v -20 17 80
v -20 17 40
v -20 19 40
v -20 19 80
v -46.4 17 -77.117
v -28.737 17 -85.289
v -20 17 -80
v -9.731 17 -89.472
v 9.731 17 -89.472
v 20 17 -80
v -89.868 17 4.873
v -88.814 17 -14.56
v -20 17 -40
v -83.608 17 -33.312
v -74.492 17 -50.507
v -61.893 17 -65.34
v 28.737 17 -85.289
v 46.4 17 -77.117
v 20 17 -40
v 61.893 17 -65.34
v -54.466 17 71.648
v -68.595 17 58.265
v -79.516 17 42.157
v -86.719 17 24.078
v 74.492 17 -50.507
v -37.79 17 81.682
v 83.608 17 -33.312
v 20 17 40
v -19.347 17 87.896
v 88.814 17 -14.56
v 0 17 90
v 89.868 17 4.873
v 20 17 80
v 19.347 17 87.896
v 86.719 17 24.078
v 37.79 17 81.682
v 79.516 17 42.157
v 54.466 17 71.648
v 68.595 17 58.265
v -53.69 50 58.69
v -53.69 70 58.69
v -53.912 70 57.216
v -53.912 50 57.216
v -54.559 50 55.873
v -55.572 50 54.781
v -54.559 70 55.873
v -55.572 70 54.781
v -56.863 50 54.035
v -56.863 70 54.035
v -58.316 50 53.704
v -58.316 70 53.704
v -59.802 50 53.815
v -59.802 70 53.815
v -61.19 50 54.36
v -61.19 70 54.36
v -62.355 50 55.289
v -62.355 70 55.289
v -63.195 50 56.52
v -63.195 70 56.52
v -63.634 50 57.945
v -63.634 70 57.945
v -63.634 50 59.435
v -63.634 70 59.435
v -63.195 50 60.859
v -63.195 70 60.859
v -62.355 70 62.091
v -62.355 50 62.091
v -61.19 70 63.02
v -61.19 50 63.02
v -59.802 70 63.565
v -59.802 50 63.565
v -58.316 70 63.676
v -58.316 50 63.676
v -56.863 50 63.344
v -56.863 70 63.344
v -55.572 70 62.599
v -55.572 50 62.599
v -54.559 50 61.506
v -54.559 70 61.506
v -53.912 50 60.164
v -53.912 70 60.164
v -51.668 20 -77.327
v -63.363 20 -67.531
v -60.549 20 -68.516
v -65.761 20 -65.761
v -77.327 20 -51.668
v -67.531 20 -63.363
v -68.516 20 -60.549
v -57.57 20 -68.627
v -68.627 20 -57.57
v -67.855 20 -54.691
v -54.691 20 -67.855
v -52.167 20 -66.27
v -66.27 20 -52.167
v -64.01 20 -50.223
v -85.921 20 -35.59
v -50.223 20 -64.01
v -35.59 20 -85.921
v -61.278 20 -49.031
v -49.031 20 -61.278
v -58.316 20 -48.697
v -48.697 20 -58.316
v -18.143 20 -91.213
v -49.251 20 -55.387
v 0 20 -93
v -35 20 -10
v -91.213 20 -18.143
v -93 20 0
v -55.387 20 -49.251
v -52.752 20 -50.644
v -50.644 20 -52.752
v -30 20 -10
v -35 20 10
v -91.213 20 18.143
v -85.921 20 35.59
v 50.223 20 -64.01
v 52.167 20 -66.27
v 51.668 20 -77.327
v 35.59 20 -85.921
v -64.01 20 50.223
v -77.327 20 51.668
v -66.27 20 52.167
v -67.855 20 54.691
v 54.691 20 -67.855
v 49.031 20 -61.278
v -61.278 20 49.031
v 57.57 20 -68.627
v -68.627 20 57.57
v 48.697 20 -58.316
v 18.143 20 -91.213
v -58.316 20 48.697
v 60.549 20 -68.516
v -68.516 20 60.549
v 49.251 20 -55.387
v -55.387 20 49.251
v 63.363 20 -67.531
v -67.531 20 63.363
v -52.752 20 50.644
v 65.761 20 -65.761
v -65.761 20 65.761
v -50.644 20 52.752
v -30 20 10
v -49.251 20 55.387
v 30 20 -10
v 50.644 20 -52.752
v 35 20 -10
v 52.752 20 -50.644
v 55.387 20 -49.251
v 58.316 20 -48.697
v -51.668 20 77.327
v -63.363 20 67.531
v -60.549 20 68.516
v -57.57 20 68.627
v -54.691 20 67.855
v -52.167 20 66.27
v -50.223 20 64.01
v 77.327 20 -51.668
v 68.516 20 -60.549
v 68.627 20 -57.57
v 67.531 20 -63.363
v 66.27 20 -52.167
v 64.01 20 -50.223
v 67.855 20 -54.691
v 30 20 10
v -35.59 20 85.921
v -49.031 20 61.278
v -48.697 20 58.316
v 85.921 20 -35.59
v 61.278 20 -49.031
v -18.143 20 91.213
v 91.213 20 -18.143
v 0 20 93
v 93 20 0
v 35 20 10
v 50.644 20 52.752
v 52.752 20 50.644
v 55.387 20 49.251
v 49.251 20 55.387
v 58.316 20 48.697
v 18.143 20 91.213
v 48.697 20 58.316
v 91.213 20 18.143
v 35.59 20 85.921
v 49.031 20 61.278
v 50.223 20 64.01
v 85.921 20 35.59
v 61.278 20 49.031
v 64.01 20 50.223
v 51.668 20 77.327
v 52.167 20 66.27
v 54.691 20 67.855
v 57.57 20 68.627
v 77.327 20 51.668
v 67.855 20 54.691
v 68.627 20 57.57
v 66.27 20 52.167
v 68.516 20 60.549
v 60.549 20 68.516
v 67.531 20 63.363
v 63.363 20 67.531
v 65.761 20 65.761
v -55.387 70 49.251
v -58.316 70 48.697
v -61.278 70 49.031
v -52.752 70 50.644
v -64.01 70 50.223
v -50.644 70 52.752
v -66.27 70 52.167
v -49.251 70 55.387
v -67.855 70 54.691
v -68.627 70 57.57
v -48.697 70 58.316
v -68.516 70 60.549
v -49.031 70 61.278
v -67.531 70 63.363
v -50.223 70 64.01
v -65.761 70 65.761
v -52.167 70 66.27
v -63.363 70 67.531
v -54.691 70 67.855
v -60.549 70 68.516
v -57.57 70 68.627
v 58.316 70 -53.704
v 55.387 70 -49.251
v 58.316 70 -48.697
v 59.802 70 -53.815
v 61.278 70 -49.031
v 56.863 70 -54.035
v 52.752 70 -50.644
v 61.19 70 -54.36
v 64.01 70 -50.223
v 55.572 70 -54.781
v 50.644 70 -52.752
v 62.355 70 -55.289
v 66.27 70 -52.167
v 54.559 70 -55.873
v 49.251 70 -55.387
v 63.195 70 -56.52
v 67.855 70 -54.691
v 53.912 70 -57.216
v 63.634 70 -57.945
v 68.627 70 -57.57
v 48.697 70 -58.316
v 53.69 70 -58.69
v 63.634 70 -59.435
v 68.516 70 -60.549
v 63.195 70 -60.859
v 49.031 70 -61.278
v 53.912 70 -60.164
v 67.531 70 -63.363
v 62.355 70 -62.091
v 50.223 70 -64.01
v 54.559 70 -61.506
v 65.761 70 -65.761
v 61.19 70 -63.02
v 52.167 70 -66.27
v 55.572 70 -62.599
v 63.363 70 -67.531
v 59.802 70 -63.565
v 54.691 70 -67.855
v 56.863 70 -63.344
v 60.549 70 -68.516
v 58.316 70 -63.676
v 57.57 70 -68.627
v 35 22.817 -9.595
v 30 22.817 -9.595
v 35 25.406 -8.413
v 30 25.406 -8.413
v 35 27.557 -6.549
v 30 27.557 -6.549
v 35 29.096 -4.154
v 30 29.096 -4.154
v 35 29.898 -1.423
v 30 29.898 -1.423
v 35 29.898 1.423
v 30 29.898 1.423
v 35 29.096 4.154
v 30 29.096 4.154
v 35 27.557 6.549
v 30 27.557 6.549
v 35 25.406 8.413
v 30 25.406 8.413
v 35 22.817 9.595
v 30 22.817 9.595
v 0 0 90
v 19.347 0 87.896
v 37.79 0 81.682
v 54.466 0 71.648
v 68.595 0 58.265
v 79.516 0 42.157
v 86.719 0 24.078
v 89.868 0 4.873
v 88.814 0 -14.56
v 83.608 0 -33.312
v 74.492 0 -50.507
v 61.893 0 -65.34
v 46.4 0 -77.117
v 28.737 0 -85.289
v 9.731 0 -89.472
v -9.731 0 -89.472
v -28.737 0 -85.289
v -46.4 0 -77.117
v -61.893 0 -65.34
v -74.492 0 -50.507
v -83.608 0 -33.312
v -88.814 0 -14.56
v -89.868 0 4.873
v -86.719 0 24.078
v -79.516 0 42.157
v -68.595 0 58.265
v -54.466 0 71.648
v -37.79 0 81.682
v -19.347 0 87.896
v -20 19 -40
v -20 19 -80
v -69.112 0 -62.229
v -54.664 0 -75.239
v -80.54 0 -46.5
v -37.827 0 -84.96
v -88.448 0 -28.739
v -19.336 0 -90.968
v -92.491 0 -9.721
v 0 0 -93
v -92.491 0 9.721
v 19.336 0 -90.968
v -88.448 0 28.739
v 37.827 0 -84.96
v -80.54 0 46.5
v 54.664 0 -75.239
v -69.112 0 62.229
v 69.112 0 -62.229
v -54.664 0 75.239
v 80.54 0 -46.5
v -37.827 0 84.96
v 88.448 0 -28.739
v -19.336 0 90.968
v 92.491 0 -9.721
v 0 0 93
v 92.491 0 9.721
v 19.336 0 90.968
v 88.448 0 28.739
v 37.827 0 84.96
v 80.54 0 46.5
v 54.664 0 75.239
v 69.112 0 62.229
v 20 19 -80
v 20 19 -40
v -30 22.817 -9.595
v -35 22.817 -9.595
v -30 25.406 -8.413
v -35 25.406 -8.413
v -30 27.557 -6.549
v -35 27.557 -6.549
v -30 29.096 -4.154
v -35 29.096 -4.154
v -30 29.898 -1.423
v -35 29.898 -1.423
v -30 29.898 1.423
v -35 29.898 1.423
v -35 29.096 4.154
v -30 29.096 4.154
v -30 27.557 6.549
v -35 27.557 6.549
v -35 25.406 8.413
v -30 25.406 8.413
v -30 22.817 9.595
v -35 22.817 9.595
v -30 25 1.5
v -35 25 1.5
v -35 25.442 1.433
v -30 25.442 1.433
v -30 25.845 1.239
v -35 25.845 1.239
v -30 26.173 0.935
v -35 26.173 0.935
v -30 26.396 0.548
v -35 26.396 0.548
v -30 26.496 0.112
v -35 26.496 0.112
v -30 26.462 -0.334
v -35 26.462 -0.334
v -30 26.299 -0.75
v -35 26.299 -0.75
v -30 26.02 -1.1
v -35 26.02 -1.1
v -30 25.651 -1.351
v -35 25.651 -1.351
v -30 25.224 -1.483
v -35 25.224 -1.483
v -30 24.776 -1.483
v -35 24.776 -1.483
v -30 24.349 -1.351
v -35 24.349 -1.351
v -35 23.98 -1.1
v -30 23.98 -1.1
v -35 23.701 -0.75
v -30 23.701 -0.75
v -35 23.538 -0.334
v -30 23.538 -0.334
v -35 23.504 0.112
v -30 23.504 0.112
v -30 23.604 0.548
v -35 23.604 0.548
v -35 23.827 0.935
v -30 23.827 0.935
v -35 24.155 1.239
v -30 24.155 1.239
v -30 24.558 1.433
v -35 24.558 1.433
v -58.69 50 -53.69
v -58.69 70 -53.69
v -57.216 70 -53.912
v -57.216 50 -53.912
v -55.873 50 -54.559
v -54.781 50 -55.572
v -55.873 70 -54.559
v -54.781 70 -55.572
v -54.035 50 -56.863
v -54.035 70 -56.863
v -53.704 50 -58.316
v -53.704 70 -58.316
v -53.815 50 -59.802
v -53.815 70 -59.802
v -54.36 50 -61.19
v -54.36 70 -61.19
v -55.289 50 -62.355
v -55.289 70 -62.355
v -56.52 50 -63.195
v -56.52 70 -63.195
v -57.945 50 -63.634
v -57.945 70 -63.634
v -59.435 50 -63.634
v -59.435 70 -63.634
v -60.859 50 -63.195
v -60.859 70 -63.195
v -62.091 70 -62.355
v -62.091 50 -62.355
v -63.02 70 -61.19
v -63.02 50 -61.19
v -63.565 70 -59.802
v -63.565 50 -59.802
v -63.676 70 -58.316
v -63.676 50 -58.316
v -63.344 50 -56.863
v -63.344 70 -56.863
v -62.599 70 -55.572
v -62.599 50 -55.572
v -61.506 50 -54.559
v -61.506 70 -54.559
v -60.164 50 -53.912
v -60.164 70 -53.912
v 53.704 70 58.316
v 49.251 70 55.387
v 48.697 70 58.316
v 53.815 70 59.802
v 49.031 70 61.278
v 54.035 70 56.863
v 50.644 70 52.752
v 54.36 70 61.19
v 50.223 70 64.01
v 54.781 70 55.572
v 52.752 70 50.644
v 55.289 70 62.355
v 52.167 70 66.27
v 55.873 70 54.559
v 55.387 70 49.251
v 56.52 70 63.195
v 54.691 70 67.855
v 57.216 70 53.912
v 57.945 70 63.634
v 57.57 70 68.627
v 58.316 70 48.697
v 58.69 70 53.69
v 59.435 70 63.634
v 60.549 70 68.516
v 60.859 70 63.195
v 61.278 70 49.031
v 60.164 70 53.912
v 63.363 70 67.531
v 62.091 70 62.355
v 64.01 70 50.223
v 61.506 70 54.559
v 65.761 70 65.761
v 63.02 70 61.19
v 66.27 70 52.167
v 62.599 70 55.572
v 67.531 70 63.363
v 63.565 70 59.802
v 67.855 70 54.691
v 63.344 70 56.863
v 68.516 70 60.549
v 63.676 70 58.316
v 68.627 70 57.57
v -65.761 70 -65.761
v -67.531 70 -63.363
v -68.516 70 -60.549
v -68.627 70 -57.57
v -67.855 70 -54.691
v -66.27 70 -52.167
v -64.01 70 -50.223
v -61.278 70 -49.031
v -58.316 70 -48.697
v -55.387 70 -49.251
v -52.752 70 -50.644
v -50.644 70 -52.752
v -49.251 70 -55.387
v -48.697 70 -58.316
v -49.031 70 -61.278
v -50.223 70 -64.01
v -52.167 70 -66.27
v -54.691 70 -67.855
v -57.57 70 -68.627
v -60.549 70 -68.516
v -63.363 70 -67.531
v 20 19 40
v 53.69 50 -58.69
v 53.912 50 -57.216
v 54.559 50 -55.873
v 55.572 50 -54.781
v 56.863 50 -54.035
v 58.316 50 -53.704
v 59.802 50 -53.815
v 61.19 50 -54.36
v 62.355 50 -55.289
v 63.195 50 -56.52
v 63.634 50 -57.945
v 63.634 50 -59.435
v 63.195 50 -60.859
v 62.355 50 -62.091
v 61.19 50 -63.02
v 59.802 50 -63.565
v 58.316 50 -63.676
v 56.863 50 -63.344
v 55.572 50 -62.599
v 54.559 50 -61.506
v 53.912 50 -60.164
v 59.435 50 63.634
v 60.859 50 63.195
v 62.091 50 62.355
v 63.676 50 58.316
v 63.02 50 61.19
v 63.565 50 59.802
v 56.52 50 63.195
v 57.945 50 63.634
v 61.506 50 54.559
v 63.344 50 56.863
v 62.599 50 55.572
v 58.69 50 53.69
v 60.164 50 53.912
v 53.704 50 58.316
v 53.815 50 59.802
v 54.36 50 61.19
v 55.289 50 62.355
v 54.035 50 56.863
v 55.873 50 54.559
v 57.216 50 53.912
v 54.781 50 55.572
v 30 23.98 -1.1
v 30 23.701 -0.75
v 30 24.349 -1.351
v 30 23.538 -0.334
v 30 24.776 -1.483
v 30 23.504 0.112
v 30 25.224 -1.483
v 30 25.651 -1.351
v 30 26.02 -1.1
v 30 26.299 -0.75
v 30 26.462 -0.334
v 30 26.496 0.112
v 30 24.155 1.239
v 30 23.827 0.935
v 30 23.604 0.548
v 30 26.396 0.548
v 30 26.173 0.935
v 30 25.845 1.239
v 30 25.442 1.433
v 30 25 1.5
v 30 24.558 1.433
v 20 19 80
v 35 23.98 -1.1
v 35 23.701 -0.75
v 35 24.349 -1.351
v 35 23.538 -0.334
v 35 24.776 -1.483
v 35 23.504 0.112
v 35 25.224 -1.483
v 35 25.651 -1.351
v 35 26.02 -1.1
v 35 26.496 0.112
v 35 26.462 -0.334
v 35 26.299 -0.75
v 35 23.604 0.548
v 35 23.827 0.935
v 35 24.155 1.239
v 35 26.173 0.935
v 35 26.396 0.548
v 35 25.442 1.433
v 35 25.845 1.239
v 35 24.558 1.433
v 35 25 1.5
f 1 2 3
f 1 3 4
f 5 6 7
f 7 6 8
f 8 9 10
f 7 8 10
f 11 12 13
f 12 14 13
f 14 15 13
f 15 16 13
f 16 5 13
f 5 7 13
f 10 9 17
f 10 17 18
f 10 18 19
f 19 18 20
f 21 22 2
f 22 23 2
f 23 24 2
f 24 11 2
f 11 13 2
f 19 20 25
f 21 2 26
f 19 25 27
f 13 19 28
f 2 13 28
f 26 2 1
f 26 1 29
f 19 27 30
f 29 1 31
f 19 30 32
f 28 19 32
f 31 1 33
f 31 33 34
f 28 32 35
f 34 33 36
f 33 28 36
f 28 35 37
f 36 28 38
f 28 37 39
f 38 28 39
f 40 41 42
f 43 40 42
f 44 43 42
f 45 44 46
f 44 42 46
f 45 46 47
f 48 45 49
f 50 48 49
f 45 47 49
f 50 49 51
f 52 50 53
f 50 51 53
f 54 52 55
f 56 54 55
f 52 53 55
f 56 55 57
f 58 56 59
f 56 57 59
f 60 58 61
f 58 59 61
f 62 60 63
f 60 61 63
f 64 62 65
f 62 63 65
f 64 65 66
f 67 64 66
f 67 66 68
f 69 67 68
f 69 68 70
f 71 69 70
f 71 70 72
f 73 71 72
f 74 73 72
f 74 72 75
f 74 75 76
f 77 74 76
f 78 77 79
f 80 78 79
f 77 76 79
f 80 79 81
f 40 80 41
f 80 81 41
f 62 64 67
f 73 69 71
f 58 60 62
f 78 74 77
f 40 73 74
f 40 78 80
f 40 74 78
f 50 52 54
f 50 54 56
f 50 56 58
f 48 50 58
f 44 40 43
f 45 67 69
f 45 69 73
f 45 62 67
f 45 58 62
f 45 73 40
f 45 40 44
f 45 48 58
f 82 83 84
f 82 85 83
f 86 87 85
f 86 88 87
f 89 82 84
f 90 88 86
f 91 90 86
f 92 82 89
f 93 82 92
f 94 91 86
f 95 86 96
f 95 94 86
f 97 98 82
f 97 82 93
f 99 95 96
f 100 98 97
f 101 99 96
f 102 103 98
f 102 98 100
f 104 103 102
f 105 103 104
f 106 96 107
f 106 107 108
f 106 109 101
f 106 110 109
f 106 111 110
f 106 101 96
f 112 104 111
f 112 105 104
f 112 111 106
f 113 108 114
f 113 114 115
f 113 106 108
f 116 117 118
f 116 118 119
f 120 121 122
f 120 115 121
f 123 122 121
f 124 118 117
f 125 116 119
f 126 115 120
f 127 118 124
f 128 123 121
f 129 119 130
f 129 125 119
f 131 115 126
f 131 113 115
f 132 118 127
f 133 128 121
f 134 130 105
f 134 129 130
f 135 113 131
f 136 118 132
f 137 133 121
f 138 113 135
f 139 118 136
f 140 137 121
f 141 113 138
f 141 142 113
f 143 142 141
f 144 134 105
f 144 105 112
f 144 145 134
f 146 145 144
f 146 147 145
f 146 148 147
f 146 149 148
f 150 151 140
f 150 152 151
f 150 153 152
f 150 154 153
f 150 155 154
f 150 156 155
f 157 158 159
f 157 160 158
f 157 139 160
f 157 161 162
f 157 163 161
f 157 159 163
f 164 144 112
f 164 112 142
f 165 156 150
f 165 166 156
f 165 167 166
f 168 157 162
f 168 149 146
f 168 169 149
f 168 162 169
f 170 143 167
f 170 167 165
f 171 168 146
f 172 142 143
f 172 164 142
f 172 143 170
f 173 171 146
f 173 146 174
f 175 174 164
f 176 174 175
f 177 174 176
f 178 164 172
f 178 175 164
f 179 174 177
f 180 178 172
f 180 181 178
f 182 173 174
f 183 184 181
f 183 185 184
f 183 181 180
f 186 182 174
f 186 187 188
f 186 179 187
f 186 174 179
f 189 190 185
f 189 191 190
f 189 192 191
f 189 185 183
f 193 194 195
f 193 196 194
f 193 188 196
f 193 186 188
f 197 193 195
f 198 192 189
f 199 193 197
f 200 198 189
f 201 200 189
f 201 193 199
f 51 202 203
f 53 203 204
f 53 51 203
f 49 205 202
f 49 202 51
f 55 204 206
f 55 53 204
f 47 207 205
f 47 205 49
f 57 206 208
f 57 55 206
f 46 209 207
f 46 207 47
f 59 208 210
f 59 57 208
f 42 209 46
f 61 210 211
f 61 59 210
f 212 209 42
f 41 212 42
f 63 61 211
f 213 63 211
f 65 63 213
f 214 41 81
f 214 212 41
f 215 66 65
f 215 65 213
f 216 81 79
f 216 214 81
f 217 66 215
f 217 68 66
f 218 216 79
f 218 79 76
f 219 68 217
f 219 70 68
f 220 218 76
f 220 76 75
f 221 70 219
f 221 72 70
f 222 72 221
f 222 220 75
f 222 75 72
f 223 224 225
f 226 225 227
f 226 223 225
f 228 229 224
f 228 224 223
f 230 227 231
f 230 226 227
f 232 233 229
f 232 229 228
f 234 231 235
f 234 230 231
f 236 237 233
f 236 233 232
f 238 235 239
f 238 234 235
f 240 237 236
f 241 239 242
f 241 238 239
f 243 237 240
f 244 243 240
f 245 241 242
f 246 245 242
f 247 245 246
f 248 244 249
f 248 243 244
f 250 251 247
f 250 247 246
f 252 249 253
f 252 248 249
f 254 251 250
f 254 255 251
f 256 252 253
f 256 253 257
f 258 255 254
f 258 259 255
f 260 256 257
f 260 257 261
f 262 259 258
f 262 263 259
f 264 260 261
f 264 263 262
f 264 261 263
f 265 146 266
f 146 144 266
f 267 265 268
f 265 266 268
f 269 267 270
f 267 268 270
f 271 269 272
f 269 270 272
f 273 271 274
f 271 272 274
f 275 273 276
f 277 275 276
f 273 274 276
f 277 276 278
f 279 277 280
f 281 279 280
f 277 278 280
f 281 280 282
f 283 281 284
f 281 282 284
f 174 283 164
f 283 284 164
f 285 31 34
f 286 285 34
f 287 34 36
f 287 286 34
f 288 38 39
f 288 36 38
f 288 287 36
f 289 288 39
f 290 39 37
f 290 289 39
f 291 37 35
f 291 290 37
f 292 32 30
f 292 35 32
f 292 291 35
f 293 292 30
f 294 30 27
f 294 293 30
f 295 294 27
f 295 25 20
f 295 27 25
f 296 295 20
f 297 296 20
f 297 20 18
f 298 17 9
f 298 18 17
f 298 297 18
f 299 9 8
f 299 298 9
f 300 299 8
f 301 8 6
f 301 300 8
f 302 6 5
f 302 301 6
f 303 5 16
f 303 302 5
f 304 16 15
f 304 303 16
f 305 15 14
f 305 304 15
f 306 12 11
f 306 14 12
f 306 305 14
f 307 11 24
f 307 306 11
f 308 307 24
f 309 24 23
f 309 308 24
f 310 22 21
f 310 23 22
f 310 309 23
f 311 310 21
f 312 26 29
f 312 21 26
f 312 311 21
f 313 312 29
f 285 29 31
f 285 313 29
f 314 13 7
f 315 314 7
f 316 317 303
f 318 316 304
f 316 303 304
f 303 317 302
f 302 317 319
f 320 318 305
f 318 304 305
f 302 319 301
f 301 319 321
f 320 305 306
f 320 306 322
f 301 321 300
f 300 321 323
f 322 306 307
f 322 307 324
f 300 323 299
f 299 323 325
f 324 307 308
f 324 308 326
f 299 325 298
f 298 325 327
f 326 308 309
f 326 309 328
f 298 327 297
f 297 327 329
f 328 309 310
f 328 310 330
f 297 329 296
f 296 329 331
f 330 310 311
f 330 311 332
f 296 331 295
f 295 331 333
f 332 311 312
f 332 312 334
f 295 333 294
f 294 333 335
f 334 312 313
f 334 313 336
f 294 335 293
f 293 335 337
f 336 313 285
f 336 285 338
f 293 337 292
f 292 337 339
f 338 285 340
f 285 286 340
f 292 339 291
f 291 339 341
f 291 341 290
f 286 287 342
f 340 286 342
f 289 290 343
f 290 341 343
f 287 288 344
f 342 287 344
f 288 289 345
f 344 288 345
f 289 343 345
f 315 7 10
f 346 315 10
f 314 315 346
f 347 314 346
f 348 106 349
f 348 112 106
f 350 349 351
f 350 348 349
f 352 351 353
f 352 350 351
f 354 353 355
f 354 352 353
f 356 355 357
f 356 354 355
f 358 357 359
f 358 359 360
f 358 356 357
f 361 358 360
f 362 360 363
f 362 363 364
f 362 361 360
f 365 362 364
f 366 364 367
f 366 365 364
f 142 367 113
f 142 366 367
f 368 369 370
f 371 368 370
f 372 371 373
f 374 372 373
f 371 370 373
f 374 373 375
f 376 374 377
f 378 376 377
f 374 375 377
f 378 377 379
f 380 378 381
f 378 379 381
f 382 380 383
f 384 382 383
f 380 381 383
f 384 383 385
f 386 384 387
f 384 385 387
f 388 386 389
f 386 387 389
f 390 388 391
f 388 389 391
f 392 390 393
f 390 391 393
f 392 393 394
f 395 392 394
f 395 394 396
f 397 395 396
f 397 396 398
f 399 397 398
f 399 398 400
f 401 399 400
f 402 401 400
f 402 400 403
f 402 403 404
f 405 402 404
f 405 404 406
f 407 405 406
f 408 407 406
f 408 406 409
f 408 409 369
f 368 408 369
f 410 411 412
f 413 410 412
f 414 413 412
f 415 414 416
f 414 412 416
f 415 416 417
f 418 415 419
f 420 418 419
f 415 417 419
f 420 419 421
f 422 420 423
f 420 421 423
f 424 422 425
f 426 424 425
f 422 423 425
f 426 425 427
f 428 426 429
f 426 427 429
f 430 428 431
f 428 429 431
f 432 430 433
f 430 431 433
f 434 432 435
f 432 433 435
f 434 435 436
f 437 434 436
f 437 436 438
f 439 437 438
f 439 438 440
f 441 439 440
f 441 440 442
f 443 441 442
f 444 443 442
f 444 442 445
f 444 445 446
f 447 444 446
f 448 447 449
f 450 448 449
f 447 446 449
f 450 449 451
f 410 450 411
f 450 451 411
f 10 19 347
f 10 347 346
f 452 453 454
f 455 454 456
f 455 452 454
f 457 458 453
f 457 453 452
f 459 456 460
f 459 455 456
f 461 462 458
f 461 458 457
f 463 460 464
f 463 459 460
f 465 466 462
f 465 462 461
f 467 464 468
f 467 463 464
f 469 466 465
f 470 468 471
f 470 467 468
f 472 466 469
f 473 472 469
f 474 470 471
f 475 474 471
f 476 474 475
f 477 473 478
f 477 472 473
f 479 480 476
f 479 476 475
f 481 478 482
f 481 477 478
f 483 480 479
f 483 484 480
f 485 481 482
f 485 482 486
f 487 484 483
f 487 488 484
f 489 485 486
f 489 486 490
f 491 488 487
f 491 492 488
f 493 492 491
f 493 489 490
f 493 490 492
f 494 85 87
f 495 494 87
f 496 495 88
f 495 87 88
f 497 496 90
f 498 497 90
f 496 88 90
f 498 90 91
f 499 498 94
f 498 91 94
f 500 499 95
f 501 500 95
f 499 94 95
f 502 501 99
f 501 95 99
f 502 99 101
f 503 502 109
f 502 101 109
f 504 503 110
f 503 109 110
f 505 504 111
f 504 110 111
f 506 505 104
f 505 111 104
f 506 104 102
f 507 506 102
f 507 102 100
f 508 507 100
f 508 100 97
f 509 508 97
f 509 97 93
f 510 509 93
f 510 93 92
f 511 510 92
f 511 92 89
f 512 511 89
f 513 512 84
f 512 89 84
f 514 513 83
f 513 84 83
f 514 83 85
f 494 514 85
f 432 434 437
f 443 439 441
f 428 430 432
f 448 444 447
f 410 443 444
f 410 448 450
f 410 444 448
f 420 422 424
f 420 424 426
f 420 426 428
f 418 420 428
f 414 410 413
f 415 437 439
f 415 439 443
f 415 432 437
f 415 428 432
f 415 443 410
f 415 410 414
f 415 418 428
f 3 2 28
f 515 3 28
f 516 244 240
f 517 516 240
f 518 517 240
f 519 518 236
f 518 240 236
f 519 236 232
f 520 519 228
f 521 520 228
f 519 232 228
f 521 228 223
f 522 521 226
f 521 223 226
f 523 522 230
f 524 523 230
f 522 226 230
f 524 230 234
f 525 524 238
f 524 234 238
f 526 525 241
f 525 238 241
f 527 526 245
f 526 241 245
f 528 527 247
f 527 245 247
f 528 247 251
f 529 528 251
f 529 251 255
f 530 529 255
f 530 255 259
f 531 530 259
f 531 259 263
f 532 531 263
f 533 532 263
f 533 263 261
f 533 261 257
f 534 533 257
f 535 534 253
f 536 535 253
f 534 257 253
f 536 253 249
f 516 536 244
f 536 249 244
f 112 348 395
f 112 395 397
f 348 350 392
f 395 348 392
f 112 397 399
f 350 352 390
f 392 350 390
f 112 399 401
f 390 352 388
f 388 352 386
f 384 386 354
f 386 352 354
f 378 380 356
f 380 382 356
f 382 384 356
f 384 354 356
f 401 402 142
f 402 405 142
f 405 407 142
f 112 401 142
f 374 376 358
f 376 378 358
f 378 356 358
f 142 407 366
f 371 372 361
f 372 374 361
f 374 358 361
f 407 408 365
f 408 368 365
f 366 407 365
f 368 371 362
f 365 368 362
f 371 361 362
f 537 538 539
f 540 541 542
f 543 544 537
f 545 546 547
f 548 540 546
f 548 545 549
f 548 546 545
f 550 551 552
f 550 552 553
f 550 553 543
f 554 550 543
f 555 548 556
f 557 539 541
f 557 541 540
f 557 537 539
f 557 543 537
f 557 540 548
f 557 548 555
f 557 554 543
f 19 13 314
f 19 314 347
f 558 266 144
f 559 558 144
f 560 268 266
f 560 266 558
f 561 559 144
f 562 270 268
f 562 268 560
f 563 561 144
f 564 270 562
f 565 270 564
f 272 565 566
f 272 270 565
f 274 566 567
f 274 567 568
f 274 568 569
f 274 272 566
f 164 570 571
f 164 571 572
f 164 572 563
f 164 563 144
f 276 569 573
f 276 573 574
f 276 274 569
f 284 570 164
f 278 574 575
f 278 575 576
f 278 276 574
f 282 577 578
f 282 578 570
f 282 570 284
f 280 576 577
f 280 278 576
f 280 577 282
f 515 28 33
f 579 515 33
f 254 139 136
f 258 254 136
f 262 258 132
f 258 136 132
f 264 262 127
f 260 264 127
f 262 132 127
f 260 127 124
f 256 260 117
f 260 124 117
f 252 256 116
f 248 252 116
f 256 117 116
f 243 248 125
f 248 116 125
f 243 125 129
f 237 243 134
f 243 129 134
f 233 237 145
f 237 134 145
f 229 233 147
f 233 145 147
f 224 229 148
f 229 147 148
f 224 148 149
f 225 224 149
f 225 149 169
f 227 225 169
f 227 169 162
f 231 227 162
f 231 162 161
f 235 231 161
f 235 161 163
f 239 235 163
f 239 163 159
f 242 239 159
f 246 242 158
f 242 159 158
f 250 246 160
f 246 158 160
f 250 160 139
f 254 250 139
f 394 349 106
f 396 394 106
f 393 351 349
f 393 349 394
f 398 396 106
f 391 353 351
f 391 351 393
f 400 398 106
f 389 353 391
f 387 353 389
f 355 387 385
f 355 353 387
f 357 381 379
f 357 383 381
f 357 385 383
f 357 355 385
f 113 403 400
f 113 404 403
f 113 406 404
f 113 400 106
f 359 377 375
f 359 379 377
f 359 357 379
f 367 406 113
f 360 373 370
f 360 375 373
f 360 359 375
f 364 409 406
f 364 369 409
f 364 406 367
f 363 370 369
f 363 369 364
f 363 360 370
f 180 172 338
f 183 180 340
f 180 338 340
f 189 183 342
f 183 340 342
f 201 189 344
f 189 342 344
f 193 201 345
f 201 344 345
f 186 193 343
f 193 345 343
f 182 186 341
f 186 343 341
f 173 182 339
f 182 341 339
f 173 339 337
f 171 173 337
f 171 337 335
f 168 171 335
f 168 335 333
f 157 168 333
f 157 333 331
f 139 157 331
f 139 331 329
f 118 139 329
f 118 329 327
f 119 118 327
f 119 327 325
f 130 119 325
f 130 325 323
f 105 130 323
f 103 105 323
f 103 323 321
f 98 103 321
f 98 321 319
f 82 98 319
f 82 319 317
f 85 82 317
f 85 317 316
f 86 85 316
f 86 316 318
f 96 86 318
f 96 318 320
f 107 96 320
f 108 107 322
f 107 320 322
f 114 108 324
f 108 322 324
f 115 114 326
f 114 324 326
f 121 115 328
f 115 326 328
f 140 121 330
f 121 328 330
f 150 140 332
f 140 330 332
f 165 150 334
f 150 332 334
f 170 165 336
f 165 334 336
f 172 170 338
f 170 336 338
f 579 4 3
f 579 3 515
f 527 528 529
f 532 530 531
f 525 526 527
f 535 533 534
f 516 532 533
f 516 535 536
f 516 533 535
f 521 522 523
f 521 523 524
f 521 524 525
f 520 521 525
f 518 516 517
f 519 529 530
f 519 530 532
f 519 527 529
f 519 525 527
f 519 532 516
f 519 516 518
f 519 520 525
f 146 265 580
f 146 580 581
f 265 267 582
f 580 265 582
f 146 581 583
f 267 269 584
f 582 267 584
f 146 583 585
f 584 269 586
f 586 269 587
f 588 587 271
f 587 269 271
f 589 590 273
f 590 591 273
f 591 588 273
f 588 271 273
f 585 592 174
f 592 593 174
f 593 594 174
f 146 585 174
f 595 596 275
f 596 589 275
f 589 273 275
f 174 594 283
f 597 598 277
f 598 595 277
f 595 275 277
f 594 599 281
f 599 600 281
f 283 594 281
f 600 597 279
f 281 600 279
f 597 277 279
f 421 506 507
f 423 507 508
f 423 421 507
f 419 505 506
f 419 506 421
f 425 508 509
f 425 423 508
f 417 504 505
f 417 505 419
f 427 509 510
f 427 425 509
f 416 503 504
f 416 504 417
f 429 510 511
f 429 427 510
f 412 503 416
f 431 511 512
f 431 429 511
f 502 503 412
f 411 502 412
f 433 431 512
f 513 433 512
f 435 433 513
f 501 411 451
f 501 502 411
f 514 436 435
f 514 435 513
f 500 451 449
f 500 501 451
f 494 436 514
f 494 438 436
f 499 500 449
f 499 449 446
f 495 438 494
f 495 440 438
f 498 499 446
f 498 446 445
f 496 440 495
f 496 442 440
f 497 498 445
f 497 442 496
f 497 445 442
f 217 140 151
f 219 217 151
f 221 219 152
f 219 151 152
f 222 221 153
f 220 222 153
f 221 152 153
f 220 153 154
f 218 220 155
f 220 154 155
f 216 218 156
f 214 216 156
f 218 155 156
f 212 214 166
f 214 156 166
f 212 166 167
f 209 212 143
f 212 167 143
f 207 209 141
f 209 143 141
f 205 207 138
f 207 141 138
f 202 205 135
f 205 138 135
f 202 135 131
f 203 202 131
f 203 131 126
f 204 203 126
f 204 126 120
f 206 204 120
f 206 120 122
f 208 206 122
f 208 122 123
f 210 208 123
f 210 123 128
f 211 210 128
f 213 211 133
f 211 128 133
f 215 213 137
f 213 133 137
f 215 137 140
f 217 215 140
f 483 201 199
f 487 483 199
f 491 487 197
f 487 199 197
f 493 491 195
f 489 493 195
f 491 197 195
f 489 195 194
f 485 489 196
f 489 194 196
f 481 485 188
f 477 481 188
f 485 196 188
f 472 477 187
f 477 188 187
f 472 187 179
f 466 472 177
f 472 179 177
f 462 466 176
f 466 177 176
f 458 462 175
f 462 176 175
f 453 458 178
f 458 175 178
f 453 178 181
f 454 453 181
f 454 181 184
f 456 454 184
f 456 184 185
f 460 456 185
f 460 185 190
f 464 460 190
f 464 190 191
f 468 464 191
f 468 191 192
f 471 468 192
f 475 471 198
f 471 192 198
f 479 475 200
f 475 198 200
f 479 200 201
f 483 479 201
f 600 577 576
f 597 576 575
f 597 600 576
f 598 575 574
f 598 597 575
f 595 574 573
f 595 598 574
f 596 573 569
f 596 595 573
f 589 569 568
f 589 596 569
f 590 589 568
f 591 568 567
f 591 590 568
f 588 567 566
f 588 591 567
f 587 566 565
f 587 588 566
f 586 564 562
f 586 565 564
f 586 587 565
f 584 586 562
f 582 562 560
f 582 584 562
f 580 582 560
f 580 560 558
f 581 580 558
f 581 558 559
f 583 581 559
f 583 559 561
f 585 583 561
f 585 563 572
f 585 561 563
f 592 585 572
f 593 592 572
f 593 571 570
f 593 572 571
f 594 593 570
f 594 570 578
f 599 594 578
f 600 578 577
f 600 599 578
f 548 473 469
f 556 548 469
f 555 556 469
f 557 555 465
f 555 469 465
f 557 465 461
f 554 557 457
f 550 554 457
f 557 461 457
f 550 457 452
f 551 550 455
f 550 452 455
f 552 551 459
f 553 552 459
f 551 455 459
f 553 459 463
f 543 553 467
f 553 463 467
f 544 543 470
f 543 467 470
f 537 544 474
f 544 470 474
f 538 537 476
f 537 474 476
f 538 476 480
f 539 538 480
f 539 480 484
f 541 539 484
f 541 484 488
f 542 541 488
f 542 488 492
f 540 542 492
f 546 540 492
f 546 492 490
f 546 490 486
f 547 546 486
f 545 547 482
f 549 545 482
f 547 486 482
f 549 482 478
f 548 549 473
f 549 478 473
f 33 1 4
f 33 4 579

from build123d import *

# Parameters (mm, degrees)
SKETCH1_R           = 93
BOSS_EXTRUDE1_DEPTH = 20
SHELL1_T            = -3
SKETCH2_W           = 5
SKETCH2_H           = 10
REVOLVE1_ANGLE      = 180
SKETCH7_R           = 1.5
CUT_EXTRUDE1_DEPTH  = 10
SKETCH8_W           = 40
SKETCH8_H           = 40
CUT_EXTRUDE2_DEPTH  = 2
SKETCH9_R           = 10
BOSS_EXTRUDE2_DEPTH = 50
SKETCH10_R          = 5
CUT_EXTRUDE3_DEPTH  = 20
CIRPATTERN1_COUNT   = 4


with BuildPart() as part:
    # Sketch1 → Boss-Extrude1 (new body)
    with BuildSketch(Plane(origin=(0, 0, 0), x_dir=(1, 0, 0), z_dir=(0, 1, 0))):
        with Locations(Location((0, 0, 0), (0, 0, 270))):
            Circle(SKETCH1_R)
    extrude(amount=BOSS_EXTRUDE1_DEPTH)

    # Shell1
    shell1_openings = [part.faces().sort_by_distance(p)[0] for p in [
        (0, 0, 0),
    ]]
    offset(amount=SHELL1_T, openings=shell1_openings, kind=Kind.INTERSECTION)

    # Sketch2 → Revolve1 (revolve)
    with BuildSketch(Plane(origin=(0, 20, 0), x_dir=(1, 0, 0), z_dir=(0, 1, 0))):
        with Locations((-32.5, 5)):
            Rectangle(SKETCH2_W, SKETCH2_H)
    revolve1 = revolve(axis=Axis((0, 20, 0), (1, 0, 0)), revolution_arc=REVOLVE1_ANGLE)

    # Sketch7 → Cut-Extrude1 (cut)
    with BuildSketch(Plane.ZY.offset(35)):
        with Locations((0, 25)):
            Circle(SKETCH7_R)
    cut_extrude1 = extrude(amount=-CUT_EXTRUDE1_DEPTH, mode=Mode.SUBTRACT)

    # Mirror1: Revolve1, Cut-Extrude1 across plane
    add(revolve1.mirror(Plane(origin=(0, 0, 0), x_dir=(0, 0, 1), z_dir=(1, 0, 0))))
    add(cut_extrude1.mirror(Plane(origin=(0, 0, 0), x_dir=(0, 0, 1), z_dir=(1, 0, 0))), mode=Mode.SUBTRACT)

    # Sketch8 → Cut-Extrude2 (cut)
    with BuildSketch(Plane.XZ.offset(-17)):
        with Locations((0, 60)):
            Rectangle(SKETCH8_W, SKETCH8_H)
    cut_extrude2 = extrude(amount=-CUT_EXTRUDE2_DEPTH, mode=Mode.SUBTRACT)

    # Mirror2: Cut-Extrude2 across plane
    add(cut_extrude2.mirror(Plane.XY), mode=Mode.SUBTRACT)

    # Sketch9 → Boss-Extrude2 (add)
    with BuildSketch(Plane(origin=(0, 20, 0), x_dir=(1, 0, 0), z_dir=(0, 1, 0))):
        with Locations(Location((-58.689862838, 58.689862838, 0), (0, 0, 135))):
            Circle(SKETCH9_R)
    boss_extrude2 = extrude(amount=BOSS_EXTRUDE2_DEPTH)

    # Sketch10 → Cut-Extrude3 (cut)
    with BuildSketch(Plane(origin=(0, 70, 0), x_dir=(1, 0, 0), z_dir=(0, 1, 0))):
        with Locations(Location((-58.689862838, 58.689862838, 0), (0, 0, 270))):
            Circle(SKETCH10_R)
    cut_extrude3 = extrude(amount=-CUT_EXTRUDE3_DEPTH, mode=Mode.SUBTRACT)

    # CirPattern1: Boss-Extrude2, Cut-Extrude3 ×4 about axis
    cirpattern1_axis = Axis((0, 0, 0), (0, 1, 0))
    add([boss_extrude2.rotate(cirpattern1_axis, i * 360 / CIRPATTERN1_COUNT) for i in range(1, CIRPATTERN1_COUNT)])
    add([cut_extrude3.rotate(cirpattern1_axis, i * 360 / CIRPATTERN1_COUNT) for i in range(1, CIRPATTERN1_COUNT)], mode=Mode.SUBTRACT)


solid = part.part
